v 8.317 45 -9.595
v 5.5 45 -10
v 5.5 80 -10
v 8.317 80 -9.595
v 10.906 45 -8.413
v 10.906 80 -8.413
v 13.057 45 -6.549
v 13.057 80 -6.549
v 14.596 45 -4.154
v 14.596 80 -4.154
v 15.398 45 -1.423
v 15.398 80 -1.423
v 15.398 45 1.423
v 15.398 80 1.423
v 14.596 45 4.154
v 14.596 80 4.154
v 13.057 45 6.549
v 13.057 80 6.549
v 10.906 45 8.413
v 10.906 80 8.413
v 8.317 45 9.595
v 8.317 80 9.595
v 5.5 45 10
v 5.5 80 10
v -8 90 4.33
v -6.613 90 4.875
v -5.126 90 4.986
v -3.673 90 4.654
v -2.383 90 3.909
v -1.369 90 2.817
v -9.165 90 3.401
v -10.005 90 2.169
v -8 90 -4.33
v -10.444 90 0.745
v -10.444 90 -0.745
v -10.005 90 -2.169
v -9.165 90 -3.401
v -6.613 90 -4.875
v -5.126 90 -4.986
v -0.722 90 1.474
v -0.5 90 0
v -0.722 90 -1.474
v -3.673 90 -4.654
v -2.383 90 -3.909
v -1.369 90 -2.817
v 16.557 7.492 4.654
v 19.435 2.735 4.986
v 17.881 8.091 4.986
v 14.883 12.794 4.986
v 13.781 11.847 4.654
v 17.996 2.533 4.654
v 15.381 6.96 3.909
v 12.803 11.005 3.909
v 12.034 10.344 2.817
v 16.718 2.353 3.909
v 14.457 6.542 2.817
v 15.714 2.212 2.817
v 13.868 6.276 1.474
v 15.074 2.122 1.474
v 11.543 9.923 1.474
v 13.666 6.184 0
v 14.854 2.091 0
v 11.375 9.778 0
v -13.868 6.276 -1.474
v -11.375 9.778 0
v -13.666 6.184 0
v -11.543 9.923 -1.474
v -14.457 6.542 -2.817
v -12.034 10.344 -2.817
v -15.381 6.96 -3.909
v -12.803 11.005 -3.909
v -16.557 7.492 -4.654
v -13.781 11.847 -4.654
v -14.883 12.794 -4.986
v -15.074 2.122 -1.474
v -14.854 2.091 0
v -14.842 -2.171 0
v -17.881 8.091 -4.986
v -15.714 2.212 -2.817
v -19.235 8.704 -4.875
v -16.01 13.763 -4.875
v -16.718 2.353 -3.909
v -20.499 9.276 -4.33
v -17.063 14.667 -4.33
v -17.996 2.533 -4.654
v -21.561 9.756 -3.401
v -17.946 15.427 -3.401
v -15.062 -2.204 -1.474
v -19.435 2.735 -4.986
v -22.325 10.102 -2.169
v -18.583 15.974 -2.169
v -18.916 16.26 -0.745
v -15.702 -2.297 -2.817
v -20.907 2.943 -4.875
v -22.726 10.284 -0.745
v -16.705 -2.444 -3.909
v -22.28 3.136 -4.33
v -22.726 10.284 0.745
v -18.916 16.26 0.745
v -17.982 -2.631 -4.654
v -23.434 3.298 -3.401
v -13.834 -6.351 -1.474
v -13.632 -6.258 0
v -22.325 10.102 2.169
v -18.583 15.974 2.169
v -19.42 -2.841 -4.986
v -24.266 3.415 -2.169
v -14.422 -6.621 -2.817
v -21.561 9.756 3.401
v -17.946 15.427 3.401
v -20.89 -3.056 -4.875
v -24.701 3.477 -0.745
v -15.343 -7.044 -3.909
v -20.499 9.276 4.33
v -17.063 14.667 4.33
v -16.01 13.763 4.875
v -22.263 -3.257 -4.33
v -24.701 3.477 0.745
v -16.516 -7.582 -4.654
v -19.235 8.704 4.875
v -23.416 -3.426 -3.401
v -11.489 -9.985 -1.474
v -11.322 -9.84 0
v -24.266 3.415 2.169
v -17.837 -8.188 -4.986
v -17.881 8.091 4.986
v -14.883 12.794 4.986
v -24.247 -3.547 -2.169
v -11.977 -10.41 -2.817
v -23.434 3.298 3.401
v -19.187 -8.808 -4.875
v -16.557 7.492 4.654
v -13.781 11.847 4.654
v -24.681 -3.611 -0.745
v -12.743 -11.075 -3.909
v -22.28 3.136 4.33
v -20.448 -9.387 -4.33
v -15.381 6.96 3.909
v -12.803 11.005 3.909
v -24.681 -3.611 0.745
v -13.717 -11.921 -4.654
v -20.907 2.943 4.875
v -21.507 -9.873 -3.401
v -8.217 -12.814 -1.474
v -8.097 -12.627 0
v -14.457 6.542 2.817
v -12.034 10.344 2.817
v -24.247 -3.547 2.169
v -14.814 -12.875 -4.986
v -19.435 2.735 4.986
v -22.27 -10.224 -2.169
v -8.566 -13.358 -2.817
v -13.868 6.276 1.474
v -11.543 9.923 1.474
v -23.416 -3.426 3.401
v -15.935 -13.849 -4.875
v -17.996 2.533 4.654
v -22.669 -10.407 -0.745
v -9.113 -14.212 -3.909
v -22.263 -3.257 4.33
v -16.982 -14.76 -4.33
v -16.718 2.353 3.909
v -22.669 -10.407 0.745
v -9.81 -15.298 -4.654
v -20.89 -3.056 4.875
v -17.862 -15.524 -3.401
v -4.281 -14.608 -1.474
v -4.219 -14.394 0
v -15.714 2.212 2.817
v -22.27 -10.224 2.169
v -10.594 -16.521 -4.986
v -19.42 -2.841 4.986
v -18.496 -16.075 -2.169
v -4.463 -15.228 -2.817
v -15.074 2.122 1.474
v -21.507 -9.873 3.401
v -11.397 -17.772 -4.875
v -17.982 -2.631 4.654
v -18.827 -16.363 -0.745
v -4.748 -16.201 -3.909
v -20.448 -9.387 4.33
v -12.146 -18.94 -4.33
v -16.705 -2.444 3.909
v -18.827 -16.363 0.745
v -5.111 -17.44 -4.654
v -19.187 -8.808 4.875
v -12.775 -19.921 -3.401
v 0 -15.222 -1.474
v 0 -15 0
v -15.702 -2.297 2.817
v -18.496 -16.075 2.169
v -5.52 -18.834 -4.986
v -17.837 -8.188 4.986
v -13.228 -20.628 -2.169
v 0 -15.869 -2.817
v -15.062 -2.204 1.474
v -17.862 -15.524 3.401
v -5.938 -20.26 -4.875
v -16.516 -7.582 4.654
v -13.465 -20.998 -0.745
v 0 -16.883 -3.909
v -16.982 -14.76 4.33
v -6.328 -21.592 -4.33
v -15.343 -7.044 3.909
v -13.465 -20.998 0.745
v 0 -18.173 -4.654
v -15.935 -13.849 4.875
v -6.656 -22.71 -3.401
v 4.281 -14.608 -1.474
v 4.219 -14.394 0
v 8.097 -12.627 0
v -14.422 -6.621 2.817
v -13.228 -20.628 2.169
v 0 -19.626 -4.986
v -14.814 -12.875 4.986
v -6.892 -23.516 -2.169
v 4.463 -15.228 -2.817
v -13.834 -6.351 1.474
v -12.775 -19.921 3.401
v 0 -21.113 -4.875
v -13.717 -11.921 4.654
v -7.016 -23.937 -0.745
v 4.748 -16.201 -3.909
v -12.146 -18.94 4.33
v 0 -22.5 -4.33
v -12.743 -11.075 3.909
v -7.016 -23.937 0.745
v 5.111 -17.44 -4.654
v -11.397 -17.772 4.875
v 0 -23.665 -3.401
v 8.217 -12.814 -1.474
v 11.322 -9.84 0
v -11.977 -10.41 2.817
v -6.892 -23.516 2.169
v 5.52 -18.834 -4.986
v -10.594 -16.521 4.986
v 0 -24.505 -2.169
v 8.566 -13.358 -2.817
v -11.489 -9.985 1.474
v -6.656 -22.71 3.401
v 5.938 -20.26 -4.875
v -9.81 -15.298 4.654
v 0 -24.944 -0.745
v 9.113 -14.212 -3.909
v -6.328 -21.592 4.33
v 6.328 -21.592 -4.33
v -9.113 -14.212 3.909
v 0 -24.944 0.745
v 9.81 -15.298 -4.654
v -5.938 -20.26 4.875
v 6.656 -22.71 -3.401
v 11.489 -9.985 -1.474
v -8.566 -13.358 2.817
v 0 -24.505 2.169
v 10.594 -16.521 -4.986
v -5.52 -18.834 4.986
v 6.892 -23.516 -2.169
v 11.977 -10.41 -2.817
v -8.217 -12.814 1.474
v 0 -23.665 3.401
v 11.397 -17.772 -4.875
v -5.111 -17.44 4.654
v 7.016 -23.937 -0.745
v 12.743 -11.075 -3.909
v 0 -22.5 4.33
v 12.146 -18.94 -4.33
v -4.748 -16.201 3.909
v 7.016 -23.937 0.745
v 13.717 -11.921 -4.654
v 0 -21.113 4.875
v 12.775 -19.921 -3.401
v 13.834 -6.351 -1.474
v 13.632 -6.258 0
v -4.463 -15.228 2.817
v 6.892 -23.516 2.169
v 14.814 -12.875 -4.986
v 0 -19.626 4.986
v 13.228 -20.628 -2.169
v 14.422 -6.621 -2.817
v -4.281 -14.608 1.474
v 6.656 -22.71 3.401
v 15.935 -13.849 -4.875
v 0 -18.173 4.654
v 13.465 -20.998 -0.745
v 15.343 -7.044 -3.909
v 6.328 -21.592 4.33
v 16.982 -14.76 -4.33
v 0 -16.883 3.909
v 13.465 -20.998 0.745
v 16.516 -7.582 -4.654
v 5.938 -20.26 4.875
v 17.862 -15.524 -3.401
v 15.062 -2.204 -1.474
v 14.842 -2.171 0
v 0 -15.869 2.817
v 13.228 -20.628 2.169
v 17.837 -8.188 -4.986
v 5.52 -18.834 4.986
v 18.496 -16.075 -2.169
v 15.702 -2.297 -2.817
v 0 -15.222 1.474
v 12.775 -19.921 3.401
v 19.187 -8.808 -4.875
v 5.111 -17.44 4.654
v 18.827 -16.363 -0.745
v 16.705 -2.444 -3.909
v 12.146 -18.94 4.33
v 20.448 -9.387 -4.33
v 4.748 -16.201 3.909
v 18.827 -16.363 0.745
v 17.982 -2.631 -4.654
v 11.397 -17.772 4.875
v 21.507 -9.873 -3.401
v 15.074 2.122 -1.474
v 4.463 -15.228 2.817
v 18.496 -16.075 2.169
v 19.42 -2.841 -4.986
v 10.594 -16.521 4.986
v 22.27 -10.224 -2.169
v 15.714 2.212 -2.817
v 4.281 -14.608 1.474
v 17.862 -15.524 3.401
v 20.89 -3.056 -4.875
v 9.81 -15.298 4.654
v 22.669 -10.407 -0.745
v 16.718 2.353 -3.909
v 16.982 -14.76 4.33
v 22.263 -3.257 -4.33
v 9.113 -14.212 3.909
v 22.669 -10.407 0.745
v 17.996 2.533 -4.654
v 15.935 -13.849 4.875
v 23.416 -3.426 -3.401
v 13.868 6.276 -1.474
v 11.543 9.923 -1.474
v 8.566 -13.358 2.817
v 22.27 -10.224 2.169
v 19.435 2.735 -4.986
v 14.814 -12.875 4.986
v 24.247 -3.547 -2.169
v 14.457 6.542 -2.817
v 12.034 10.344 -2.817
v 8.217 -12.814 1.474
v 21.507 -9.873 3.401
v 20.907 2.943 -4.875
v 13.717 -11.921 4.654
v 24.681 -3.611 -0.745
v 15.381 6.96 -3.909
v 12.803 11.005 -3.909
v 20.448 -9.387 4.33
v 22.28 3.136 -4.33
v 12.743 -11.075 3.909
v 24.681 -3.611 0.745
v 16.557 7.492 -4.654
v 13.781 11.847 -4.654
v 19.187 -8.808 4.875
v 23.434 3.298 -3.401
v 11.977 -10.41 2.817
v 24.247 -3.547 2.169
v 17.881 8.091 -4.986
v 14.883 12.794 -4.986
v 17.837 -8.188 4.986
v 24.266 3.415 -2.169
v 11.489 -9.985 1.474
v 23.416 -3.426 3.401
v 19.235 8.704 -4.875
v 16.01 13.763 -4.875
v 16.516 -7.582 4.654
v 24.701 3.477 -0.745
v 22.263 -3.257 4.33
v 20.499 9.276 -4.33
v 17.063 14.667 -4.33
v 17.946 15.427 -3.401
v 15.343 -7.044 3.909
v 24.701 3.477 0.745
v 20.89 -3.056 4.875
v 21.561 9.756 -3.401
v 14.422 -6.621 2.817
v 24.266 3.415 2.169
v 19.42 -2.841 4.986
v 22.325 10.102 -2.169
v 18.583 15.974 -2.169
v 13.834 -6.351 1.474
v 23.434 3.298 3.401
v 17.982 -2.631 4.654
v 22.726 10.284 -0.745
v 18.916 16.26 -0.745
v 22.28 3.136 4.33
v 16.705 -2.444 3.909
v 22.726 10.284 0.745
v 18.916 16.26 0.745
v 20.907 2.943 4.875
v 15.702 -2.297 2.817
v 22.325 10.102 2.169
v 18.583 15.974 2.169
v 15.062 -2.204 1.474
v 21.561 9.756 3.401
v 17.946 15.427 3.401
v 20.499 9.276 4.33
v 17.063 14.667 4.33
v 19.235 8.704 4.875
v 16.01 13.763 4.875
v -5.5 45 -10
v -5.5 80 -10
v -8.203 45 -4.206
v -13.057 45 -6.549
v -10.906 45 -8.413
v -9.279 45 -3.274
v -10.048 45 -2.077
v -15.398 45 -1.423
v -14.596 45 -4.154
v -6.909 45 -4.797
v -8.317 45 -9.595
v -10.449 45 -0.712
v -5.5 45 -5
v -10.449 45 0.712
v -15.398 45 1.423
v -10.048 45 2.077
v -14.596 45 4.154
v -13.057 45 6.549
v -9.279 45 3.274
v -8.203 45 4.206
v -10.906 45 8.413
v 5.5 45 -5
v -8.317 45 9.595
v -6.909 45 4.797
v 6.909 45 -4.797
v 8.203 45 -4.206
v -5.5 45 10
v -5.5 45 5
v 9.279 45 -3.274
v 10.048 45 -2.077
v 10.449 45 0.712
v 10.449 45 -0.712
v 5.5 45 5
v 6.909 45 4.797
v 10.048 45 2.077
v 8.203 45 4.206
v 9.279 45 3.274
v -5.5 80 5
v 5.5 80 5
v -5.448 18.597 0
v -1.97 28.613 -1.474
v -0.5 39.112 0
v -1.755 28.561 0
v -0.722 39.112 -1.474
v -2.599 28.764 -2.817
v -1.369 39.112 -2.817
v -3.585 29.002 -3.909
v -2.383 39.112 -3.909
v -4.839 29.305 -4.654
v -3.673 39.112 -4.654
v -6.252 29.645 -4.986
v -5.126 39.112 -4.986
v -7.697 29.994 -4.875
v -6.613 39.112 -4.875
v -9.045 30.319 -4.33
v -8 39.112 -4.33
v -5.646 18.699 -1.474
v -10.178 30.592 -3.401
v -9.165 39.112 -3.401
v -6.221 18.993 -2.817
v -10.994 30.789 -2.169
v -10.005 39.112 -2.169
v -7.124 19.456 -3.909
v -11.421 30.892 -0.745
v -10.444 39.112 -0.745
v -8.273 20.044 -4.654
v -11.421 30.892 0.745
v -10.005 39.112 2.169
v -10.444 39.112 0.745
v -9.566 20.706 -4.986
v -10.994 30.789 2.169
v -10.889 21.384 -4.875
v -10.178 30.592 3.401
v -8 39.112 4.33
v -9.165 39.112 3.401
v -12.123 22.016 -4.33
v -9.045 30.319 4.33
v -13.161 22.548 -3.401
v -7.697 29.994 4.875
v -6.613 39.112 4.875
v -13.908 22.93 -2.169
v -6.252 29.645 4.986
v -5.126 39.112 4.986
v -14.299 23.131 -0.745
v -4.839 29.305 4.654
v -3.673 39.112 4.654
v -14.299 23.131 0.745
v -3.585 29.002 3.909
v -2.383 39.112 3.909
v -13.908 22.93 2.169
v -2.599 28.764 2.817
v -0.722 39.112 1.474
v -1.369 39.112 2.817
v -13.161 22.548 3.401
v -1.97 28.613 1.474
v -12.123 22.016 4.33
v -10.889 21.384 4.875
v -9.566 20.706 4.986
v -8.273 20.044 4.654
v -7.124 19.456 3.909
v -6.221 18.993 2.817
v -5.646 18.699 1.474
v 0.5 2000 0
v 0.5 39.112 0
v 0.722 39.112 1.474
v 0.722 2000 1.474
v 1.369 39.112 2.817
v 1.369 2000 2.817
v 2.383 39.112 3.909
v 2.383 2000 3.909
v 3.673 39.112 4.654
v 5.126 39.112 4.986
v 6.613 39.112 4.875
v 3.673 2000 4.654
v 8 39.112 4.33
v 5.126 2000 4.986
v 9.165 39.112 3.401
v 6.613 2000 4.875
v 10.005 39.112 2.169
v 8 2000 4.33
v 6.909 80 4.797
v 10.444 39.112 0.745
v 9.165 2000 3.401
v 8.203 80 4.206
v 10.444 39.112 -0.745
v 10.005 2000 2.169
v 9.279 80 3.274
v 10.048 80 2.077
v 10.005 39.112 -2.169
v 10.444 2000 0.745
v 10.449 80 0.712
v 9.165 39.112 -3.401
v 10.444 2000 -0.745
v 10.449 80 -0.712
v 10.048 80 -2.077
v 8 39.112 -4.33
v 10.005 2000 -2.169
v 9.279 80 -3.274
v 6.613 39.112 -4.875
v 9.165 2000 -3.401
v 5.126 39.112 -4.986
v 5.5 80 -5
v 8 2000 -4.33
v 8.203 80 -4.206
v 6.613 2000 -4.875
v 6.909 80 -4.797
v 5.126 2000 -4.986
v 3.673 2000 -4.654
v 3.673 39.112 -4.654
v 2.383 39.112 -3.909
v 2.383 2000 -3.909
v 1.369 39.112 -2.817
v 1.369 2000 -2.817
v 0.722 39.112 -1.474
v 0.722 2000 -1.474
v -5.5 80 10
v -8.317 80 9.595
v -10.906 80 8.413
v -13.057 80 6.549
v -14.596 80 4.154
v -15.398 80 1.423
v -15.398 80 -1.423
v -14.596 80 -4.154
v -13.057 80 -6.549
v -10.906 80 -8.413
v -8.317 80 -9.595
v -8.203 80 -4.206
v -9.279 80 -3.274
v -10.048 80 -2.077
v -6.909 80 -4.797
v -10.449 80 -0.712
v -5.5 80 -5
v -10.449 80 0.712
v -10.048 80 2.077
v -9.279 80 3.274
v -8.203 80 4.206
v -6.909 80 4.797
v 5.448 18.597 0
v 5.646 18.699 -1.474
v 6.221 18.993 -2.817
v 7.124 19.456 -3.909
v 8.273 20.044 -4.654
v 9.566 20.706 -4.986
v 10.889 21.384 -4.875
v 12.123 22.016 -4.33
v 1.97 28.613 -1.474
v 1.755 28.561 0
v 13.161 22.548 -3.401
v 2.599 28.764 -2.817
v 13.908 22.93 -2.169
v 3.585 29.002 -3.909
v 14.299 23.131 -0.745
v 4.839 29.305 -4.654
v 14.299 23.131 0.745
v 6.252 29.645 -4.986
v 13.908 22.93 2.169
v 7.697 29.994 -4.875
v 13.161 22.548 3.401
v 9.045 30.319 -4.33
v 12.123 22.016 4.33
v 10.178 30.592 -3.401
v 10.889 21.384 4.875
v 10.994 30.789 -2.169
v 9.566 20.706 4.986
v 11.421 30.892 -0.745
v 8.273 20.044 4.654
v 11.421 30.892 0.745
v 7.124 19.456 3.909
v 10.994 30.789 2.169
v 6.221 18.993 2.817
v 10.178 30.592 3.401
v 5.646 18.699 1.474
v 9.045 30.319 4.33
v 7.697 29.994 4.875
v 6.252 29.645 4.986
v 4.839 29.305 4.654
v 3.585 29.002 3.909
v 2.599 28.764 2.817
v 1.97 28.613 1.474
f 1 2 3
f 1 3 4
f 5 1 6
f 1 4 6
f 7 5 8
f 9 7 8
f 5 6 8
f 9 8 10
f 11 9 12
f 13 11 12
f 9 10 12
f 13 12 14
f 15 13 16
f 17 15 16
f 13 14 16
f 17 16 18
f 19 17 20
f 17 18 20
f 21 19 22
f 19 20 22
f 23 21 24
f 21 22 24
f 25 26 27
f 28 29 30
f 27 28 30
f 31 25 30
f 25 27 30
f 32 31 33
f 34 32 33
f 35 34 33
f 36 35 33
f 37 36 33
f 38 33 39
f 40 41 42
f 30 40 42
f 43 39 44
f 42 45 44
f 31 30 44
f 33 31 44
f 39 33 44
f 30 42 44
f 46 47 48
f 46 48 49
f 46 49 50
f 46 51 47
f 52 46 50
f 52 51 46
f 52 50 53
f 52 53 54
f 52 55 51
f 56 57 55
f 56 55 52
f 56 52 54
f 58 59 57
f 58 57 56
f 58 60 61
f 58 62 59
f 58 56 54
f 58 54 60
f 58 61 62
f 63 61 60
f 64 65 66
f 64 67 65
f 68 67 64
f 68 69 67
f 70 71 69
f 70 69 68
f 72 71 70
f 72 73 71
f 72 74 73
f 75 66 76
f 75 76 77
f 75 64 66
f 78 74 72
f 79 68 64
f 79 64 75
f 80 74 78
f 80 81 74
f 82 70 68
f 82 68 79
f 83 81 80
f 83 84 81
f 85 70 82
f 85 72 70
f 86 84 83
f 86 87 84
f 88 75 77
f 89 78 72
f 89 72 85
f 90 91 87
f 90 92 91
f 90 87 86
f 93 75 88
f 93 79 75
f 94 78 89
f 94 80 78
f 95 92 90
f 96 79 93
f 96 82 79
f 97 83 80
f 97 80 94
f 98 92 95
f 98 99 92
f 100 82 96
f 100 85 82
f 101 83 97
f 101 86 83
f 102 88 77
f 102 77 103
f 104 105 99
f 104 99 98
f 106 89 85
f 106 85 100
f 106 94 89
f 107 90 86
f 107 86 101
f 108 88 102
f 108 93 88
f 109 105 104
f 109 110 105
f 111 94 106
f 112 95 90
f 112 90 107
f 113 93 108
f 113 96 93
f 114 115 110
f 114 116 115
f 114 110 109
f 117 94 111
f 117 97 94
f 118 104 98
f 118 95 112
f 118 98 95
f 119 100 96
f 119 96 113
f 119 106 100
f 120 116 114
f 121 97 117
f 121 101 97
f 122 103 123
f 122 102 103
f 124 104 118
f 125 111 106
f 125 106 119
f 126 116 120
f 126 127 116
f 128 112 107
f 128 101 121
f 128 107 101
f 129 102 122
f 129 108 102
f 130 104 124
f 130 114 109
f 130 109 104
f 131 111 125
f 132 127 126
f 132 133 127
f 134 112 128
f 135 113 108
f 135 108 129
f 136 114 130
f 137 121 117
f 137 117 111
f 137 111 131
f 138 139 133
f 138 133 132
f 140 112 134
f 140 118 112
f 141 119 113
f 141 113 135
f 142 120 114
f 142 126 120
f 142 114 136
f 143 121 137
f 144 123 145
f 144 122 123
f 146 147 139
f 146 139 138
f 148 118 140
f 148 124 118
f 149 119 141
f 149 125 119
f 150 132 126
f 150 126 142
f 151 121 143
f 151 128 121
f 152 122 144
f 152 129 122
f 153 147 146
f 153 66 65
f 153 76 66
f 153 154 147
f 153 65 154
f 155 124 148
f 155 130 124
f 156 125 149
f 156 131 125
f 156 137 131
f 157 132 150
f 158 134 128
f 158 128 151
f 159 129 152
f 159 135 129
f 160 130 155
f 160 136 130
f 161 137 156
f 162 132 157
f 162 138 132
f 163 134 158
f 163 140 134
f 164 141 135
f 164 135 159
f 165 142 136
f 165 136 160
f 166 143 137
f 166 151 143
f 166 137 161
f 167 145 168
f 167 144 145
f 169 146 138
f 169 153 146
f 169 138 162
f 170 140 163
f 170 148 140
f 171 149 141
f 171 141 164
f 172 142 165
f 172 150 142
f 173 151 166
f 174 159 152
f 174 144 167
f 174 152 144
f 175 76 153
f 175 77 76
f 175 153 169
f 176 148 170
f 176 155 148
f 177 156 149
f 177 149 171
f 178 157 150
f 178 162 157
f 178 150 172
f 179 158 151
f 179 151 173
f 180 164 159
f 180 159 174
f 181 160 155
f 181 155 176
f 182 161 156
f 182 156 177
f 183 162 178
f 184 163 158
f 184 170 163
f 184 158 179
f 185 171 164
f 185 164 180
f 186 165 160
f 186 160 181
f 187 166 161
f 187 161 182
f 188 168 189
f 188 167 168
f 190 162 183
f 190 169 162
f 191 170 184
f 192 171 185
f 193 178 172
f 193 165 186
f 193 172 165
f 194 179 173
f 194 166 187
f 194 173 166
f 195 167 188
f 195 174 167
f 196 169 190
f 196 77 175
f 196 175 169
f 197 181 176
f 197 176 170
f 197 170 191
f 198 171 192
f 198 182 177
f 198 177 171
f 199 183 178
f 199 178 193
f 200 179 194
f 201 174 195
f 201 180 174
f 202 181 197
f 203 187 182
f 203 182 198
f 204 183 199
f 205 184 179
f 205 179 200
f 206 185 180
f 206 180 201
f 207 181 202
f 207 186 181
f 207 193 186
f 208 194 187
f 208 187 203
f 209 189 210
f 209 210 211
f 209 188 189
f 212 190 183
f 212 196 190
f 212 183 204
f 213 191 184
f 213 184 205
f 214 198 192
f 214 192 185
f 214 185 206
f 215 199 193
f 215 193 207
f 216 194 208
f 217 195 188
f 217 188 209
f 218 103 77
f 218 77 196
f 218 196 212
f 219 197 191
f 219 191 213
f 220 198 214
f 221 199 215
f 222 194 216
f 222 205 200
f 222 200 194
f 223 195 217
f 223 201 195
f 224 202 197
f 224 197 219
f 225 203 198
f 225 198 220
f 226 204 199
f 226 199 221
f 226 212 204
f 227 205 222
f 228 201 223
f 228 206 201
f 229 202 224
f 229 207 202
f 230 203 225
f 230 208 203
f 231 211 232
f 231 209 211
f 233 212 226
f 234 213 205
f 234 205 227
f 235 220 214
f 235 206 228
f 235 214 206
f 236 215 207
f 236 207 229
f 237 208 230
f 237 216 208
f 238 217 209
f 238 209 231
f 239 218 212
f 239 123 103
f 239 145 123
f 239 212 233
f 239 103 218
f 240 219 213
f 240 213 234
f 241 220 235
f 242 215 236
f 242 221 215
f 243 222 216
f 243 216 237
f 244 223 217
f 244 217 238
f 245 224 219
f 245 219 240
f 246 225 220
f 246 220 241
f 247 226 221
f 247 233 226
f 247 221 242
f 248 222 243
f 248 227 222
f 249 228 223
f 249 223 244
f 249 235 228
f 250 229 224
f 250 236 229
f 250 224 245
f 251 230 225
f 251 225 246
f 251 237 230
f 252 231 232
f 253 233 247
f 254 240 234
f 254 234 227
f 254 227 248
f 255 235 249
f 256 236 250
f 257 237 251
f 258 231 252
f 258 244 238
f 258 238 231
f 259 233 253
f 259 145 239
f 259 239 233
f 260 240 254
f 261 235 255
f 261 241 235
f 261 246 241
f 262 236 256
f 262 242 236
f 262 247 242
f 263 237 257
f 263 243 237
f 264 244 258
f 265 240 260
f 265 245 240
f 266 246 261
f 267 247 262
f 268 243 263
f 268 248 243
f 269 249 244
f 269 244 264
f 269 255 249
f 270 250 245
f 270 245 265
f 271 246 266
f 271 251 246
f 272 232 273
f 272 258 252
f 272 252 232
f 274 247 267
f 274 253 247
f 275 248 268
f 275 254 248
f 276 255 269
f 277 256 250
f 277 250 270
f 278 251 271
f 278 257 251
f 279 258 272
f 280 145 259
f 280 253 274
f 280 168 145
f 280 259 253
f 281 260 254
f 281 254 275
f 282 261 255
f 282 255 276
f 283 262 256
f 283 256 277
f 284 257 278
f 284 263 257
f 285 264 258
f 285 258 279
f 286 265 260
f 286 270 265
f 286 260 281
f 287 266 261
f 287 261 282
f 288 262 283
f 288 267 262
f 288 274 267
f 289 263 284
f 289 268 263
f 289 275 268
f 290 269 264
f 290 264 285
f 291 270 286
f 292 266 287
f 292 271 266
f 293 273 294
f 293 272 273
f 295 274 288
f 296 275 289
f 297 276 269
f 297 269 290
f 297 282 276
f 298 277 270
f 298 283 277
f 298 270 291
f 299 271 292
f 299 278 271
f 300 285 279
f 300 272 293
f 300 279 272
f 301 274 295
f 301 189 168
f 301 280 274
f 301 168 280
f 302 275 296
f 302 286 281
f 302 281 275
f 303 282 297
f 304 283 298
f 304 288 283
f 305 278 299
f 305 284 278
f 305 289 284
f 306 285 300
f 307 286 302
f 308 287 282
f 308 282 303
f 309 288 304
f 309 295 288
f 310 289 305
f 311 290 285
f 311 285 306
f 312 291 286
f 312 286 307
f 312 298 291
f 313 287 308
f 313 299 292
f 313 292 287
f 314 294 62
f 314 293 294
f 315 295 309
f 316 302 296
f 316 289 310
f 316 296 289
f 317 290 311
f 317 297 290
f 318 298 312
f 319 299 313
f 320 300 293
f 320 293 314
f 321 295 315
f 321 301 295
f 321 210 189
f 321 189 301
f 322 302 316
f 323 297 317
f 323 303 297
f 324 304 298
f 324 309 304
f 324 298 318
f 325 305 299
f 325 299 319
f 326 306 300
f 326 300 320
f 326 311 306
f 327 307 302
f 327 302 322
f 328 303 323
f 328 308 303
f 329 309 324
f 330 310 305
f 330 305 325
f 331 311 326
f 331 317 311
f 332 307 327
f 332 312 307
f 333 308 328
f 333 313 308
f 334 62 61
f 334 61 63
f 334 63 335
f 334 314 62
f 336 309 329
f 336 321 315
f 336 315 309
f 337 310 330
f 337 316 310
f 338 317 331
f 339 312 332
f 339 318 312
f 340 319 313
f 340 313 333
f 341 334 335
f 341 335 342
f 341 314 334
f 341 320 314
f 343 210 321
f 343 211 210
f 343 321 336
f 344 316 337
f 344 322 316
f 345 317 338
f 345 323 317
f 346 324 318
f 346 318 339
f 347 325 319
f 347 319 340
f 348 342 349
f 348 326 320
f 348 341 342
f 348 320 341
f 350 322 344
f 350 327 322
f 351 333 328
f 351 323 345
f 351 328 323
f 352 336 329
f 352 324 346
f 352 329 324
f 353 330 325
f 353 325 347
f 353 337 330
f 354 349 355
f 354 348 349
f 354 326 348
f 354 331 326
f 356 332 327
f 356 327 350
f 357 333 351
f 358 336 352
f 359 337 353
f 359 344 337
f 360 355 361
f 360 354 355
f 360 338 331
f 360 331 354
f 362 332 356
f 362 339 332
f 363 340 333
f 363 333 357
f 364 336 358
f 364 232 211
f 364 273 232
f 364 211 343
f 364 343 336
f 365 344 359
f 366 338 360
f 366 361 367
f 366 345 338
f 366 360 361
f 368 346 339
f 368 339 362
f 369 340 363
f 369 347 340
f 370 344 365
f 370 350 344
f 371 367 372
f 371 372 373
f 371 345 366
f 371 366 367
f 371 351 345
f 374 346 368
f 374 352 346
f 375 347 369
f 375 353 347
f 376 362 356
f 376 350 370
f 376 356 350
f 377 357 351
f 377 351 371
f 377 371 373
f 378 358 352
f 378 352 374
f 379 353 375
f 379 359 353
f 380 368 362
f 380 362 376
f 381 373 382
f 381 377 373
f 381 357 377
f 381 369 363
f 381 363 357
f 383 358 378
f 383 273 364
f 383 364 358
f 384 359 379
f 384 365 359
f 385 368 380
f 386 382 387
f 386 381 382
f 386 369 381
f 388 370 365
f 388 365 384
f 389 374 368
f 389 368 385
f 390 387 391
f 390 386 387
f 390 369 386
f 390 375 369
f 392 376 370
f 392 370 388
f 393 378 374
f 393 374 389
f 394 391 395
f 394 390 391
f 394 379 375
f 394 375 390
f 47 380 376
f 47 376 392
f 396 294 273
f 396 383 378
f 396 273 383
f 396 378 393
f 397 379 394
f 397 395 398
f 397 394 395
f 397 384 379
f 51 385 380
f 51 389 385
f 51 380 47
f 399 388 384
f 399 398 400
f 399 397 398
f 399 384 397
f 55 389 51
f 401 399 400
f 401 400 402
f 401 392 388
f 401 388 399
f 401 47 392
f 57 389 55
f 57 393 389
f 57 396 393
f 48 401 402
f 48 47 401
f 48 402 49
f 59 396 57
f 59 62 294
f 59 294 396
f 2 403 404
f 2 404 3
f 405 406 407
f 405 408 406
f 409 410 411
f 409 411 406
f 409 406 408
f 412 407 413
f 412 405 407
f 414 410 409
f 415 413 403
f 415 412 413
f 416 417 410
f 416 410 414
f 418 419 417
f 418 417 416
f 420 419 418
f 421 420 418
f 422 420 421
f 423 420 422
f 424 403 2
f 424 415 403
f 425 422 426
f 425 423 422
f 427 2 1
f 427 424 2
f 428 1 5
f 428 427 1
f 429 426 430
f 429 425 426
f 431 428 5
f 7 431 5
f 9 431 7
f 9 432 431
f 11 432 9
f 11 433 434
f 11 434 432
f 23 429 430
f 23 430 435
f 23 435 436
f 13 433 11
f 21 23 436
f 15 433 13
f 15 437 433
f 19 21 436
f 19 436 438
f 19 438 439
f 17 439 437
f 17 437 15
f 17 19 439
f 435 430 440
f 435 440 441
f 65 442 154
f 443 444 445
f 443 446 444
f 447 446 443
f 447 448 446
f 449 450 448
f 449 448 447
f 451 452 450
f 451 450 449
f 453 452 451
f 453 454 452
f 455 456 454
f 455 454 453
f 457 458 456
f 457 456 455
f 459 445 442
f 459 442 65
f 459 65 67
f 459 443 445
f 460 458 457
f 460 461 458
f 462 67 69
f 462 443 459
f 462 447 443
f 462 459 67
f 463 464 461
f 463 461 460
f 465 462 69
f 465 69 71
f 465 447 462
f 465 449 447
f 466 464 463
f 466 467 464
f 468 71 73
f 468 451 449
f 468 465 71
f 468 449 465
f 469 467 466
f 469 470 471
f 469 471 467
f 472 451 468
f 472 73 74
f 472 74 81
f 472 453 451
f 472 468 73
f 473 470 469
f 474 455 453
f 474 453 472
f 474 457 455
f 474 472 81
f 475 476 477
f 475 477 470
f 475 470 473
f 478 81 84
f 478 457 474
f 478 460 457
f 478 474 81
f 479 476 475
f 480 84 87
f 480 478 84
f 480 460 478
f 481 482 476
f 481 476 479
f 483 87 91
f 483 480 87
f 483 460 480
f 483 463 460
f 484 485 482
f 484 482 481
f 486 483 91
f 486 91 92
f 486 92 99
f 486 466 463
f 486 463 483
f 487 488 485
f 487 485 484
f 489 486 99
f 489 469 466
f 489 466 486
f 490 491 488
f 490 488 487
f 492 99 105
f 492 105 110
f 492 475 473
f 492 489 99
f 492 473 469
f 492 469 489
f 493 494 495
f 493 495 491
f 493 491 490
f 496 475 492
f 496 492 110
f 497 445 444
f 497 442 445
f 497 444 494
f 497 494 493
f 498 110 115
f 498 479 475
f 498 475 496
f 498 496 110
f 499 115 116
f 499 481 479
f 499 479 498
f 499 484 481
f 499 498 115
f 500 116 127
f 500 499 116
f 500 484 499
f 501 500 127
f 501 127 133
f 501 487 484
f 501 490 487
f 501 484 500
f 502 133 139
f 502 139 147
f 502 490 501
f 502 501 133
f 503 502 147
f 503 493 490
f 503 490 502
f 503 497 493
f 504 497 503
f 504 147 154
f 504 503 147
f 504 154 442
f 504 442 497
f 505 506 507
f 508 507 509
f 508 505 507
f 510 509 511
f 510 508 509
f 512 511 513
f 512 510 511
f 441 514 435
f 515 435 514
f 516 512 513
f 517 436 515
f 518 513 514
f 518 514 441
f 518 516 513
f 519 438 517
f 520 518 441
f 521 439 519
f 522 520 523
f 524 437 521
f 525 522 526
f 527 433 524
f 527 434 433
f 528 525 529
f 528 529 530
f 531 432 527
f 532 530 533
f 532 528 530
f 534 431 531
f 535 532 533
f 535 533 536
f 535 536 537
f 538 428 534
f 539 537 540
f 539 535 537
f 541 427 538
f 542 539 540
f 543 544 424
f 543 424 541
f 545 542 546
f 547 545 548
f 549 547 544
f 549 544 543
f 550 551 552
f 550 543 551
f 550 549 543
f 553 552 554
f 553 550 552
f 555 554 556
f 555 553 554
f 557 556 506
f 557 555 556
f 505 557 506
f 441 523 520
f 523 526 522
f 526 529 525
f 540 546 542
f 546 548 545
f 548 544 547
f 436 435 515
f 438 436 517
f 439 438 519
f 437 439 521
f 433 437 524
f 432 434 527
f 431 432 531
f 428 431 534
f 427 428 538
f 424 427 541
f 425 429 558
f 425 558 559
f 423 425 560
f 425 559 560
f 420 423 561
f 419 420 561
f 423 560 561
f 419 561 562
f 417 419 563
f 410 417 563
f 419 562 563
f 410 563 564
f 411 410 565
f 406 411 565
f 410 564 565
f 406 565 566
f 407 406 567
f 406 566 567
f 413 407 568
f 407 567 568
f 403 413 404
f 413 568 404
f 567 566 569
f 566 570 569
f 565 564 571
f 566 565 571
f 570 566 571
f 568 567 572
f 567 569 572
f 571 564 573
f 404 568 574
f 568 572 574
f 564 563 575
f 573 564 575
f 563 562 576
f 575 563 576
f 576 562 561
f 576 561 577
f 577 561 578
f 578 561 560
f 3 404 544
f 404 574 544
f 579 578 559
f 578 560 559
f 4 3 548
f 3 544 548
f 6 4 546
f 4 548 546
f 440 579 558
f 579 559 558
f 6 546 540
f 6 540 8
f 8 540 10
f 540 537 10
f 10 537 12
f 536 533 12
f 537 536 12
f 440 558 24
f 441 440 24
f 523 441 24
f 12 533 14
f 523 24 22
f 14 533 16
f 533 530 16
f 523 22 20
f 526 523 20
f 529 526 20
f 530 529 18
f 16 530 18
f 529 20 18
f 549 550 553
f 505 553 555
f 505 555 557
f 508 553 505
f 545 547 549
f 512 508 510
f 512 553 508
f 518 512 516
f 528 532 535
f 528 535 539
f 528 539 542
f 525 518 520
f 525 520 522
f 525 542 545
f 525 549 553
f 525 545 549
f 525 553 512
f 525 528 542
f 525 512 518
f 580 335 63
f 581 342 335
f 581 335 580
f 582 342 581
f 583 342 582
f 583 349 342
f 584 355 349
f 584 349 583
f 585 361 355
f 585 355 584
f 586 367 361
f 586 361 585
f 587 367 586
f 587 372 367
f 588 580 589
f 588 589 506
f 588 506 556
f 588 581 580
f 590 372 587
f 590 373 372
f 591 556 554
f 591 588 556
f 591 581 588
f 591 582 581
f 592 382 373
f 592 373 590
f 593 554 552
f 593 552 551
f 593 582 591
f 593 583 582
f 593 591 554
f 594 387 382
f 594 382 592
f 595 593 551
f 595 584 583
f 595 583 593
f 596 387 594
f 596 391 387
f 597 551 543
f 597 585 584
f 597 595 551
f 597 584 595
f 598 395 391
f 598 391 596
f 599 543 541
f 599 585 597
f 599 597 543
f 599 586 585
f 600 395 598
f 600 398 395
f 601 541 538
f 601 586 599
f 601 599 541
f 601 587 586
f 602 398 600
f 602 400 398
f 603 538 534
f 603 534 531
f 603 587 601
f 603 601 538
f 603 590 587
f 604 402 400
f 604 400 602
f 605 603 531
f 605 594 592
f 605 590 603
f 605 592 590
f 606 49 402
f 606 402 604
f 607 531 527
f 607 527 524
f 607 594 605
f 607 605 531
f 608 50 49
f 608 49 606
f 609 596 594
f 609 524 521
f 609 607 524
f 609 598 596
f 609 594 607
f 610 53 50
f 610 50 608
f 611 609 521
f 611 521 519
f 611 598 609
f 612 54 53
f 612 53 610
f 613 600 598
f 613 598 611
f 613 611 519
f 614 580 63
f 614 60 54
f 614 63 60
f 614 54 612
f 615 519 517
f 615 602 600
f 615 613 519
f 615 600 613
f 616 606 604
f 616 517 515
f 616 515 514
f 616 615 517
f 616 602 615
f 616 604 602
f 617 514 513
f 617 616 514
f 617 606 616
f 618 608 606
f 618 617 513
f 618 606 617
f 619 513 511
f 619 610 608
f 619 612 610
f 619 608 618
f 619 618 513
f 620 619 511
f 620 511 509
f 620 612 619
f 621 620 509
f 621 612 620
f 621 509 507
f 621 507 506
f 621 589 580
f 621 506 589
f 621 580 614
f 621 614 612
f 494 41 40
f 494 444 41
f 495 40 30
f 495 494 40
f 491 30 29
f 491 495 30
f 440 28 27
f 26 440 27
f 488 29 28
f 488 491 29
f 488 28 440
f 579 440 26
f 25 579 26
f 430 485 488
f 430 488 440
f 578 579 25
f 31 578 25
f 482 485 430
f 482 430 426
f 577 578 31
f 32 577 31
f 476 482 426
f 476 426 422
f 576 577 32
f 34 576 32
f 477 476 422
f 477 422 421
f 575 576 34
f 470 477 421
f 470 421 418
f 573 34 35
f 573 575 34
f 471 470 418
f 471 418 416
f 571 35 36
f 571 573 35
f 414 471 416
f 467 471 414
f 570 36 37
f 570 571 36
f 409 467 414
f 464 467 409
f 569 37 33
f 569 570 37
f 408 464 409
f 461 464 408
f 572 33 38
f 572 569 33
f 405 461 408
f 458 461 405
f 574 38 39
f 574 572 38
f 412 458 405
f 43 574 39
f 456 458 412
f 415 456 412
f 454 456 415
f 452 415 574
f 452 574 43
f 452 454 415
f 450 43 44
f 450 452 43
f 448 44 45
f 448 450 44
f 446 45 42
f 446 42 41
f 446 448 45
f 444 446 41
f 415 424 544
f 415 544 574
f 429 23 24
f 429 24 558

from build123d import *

# Parameters (mm, degrees)
F2_R     = 5
F6_DEPTH = 35


with BuildPart() as f3:
    # F3: sweep along a path in F0
    with BuildLine(Plane.XY) as f3_path:
        Line((-5.5, 90), (-5.5, 39.1120186132))
        ThreePointArc((-5.5, 39.1120186132), (-7.9944448559, 25.2075828701), (-15.1666666667, 13.0373395377))
        ThreePointArc((-15.1666666667, 13.0373395377), (0, -20), (15.1666666667, 13.0373395377))
        ThreePointArc((15.1666666667, 13.0373395377), (7.9944448559, 25.2075828701), (5.5, 39.1120186132))
        Line((5.5, 39.1120186132), (5.5, 2000))
    # F2 (on plane+point) → F3 (sweep)
    with BuildSketch(Plane.XZ.offset(-90)):
        with Locations((-5.5, 0)):
            Circle(F2_R)
    sweep(path=f3_path.line)

    # F5 (on offset) → F6 (join)
    with BuildSketch(Plane.XZ.offset(-80)):
        with BuildLine():
            Line((-5.5, -10.0000000344), (5.5, -10.0000000344))
            ThreePointArc((5.5, -10.0000000344), (15.5000000344, 0), (5.5, 10.0000000344))
            Line((5.5, 10.0000000344), (-5.5, 10.0000000344))
            ThreePointArc((-5.5, 10.0000000344), (-15.5000000344, 0), (-5.5, -10.0000000344))
        make_face()
        with BuildLine():
            ThreePointArc((-5.5, -5), (-10.5, 0), (-5.5, 5))
            Line((-5.5, 5), (5.5, 5))
            ThreePointArc((5.5, 5), (10.5, 0), (5.5, -5))
            Line((5.5, -5), (-5.5, -5))
        make_face(mode=Mode.SUBTRACT)
    extrude(amount=F6_DEPTH)


solid = f3.part
